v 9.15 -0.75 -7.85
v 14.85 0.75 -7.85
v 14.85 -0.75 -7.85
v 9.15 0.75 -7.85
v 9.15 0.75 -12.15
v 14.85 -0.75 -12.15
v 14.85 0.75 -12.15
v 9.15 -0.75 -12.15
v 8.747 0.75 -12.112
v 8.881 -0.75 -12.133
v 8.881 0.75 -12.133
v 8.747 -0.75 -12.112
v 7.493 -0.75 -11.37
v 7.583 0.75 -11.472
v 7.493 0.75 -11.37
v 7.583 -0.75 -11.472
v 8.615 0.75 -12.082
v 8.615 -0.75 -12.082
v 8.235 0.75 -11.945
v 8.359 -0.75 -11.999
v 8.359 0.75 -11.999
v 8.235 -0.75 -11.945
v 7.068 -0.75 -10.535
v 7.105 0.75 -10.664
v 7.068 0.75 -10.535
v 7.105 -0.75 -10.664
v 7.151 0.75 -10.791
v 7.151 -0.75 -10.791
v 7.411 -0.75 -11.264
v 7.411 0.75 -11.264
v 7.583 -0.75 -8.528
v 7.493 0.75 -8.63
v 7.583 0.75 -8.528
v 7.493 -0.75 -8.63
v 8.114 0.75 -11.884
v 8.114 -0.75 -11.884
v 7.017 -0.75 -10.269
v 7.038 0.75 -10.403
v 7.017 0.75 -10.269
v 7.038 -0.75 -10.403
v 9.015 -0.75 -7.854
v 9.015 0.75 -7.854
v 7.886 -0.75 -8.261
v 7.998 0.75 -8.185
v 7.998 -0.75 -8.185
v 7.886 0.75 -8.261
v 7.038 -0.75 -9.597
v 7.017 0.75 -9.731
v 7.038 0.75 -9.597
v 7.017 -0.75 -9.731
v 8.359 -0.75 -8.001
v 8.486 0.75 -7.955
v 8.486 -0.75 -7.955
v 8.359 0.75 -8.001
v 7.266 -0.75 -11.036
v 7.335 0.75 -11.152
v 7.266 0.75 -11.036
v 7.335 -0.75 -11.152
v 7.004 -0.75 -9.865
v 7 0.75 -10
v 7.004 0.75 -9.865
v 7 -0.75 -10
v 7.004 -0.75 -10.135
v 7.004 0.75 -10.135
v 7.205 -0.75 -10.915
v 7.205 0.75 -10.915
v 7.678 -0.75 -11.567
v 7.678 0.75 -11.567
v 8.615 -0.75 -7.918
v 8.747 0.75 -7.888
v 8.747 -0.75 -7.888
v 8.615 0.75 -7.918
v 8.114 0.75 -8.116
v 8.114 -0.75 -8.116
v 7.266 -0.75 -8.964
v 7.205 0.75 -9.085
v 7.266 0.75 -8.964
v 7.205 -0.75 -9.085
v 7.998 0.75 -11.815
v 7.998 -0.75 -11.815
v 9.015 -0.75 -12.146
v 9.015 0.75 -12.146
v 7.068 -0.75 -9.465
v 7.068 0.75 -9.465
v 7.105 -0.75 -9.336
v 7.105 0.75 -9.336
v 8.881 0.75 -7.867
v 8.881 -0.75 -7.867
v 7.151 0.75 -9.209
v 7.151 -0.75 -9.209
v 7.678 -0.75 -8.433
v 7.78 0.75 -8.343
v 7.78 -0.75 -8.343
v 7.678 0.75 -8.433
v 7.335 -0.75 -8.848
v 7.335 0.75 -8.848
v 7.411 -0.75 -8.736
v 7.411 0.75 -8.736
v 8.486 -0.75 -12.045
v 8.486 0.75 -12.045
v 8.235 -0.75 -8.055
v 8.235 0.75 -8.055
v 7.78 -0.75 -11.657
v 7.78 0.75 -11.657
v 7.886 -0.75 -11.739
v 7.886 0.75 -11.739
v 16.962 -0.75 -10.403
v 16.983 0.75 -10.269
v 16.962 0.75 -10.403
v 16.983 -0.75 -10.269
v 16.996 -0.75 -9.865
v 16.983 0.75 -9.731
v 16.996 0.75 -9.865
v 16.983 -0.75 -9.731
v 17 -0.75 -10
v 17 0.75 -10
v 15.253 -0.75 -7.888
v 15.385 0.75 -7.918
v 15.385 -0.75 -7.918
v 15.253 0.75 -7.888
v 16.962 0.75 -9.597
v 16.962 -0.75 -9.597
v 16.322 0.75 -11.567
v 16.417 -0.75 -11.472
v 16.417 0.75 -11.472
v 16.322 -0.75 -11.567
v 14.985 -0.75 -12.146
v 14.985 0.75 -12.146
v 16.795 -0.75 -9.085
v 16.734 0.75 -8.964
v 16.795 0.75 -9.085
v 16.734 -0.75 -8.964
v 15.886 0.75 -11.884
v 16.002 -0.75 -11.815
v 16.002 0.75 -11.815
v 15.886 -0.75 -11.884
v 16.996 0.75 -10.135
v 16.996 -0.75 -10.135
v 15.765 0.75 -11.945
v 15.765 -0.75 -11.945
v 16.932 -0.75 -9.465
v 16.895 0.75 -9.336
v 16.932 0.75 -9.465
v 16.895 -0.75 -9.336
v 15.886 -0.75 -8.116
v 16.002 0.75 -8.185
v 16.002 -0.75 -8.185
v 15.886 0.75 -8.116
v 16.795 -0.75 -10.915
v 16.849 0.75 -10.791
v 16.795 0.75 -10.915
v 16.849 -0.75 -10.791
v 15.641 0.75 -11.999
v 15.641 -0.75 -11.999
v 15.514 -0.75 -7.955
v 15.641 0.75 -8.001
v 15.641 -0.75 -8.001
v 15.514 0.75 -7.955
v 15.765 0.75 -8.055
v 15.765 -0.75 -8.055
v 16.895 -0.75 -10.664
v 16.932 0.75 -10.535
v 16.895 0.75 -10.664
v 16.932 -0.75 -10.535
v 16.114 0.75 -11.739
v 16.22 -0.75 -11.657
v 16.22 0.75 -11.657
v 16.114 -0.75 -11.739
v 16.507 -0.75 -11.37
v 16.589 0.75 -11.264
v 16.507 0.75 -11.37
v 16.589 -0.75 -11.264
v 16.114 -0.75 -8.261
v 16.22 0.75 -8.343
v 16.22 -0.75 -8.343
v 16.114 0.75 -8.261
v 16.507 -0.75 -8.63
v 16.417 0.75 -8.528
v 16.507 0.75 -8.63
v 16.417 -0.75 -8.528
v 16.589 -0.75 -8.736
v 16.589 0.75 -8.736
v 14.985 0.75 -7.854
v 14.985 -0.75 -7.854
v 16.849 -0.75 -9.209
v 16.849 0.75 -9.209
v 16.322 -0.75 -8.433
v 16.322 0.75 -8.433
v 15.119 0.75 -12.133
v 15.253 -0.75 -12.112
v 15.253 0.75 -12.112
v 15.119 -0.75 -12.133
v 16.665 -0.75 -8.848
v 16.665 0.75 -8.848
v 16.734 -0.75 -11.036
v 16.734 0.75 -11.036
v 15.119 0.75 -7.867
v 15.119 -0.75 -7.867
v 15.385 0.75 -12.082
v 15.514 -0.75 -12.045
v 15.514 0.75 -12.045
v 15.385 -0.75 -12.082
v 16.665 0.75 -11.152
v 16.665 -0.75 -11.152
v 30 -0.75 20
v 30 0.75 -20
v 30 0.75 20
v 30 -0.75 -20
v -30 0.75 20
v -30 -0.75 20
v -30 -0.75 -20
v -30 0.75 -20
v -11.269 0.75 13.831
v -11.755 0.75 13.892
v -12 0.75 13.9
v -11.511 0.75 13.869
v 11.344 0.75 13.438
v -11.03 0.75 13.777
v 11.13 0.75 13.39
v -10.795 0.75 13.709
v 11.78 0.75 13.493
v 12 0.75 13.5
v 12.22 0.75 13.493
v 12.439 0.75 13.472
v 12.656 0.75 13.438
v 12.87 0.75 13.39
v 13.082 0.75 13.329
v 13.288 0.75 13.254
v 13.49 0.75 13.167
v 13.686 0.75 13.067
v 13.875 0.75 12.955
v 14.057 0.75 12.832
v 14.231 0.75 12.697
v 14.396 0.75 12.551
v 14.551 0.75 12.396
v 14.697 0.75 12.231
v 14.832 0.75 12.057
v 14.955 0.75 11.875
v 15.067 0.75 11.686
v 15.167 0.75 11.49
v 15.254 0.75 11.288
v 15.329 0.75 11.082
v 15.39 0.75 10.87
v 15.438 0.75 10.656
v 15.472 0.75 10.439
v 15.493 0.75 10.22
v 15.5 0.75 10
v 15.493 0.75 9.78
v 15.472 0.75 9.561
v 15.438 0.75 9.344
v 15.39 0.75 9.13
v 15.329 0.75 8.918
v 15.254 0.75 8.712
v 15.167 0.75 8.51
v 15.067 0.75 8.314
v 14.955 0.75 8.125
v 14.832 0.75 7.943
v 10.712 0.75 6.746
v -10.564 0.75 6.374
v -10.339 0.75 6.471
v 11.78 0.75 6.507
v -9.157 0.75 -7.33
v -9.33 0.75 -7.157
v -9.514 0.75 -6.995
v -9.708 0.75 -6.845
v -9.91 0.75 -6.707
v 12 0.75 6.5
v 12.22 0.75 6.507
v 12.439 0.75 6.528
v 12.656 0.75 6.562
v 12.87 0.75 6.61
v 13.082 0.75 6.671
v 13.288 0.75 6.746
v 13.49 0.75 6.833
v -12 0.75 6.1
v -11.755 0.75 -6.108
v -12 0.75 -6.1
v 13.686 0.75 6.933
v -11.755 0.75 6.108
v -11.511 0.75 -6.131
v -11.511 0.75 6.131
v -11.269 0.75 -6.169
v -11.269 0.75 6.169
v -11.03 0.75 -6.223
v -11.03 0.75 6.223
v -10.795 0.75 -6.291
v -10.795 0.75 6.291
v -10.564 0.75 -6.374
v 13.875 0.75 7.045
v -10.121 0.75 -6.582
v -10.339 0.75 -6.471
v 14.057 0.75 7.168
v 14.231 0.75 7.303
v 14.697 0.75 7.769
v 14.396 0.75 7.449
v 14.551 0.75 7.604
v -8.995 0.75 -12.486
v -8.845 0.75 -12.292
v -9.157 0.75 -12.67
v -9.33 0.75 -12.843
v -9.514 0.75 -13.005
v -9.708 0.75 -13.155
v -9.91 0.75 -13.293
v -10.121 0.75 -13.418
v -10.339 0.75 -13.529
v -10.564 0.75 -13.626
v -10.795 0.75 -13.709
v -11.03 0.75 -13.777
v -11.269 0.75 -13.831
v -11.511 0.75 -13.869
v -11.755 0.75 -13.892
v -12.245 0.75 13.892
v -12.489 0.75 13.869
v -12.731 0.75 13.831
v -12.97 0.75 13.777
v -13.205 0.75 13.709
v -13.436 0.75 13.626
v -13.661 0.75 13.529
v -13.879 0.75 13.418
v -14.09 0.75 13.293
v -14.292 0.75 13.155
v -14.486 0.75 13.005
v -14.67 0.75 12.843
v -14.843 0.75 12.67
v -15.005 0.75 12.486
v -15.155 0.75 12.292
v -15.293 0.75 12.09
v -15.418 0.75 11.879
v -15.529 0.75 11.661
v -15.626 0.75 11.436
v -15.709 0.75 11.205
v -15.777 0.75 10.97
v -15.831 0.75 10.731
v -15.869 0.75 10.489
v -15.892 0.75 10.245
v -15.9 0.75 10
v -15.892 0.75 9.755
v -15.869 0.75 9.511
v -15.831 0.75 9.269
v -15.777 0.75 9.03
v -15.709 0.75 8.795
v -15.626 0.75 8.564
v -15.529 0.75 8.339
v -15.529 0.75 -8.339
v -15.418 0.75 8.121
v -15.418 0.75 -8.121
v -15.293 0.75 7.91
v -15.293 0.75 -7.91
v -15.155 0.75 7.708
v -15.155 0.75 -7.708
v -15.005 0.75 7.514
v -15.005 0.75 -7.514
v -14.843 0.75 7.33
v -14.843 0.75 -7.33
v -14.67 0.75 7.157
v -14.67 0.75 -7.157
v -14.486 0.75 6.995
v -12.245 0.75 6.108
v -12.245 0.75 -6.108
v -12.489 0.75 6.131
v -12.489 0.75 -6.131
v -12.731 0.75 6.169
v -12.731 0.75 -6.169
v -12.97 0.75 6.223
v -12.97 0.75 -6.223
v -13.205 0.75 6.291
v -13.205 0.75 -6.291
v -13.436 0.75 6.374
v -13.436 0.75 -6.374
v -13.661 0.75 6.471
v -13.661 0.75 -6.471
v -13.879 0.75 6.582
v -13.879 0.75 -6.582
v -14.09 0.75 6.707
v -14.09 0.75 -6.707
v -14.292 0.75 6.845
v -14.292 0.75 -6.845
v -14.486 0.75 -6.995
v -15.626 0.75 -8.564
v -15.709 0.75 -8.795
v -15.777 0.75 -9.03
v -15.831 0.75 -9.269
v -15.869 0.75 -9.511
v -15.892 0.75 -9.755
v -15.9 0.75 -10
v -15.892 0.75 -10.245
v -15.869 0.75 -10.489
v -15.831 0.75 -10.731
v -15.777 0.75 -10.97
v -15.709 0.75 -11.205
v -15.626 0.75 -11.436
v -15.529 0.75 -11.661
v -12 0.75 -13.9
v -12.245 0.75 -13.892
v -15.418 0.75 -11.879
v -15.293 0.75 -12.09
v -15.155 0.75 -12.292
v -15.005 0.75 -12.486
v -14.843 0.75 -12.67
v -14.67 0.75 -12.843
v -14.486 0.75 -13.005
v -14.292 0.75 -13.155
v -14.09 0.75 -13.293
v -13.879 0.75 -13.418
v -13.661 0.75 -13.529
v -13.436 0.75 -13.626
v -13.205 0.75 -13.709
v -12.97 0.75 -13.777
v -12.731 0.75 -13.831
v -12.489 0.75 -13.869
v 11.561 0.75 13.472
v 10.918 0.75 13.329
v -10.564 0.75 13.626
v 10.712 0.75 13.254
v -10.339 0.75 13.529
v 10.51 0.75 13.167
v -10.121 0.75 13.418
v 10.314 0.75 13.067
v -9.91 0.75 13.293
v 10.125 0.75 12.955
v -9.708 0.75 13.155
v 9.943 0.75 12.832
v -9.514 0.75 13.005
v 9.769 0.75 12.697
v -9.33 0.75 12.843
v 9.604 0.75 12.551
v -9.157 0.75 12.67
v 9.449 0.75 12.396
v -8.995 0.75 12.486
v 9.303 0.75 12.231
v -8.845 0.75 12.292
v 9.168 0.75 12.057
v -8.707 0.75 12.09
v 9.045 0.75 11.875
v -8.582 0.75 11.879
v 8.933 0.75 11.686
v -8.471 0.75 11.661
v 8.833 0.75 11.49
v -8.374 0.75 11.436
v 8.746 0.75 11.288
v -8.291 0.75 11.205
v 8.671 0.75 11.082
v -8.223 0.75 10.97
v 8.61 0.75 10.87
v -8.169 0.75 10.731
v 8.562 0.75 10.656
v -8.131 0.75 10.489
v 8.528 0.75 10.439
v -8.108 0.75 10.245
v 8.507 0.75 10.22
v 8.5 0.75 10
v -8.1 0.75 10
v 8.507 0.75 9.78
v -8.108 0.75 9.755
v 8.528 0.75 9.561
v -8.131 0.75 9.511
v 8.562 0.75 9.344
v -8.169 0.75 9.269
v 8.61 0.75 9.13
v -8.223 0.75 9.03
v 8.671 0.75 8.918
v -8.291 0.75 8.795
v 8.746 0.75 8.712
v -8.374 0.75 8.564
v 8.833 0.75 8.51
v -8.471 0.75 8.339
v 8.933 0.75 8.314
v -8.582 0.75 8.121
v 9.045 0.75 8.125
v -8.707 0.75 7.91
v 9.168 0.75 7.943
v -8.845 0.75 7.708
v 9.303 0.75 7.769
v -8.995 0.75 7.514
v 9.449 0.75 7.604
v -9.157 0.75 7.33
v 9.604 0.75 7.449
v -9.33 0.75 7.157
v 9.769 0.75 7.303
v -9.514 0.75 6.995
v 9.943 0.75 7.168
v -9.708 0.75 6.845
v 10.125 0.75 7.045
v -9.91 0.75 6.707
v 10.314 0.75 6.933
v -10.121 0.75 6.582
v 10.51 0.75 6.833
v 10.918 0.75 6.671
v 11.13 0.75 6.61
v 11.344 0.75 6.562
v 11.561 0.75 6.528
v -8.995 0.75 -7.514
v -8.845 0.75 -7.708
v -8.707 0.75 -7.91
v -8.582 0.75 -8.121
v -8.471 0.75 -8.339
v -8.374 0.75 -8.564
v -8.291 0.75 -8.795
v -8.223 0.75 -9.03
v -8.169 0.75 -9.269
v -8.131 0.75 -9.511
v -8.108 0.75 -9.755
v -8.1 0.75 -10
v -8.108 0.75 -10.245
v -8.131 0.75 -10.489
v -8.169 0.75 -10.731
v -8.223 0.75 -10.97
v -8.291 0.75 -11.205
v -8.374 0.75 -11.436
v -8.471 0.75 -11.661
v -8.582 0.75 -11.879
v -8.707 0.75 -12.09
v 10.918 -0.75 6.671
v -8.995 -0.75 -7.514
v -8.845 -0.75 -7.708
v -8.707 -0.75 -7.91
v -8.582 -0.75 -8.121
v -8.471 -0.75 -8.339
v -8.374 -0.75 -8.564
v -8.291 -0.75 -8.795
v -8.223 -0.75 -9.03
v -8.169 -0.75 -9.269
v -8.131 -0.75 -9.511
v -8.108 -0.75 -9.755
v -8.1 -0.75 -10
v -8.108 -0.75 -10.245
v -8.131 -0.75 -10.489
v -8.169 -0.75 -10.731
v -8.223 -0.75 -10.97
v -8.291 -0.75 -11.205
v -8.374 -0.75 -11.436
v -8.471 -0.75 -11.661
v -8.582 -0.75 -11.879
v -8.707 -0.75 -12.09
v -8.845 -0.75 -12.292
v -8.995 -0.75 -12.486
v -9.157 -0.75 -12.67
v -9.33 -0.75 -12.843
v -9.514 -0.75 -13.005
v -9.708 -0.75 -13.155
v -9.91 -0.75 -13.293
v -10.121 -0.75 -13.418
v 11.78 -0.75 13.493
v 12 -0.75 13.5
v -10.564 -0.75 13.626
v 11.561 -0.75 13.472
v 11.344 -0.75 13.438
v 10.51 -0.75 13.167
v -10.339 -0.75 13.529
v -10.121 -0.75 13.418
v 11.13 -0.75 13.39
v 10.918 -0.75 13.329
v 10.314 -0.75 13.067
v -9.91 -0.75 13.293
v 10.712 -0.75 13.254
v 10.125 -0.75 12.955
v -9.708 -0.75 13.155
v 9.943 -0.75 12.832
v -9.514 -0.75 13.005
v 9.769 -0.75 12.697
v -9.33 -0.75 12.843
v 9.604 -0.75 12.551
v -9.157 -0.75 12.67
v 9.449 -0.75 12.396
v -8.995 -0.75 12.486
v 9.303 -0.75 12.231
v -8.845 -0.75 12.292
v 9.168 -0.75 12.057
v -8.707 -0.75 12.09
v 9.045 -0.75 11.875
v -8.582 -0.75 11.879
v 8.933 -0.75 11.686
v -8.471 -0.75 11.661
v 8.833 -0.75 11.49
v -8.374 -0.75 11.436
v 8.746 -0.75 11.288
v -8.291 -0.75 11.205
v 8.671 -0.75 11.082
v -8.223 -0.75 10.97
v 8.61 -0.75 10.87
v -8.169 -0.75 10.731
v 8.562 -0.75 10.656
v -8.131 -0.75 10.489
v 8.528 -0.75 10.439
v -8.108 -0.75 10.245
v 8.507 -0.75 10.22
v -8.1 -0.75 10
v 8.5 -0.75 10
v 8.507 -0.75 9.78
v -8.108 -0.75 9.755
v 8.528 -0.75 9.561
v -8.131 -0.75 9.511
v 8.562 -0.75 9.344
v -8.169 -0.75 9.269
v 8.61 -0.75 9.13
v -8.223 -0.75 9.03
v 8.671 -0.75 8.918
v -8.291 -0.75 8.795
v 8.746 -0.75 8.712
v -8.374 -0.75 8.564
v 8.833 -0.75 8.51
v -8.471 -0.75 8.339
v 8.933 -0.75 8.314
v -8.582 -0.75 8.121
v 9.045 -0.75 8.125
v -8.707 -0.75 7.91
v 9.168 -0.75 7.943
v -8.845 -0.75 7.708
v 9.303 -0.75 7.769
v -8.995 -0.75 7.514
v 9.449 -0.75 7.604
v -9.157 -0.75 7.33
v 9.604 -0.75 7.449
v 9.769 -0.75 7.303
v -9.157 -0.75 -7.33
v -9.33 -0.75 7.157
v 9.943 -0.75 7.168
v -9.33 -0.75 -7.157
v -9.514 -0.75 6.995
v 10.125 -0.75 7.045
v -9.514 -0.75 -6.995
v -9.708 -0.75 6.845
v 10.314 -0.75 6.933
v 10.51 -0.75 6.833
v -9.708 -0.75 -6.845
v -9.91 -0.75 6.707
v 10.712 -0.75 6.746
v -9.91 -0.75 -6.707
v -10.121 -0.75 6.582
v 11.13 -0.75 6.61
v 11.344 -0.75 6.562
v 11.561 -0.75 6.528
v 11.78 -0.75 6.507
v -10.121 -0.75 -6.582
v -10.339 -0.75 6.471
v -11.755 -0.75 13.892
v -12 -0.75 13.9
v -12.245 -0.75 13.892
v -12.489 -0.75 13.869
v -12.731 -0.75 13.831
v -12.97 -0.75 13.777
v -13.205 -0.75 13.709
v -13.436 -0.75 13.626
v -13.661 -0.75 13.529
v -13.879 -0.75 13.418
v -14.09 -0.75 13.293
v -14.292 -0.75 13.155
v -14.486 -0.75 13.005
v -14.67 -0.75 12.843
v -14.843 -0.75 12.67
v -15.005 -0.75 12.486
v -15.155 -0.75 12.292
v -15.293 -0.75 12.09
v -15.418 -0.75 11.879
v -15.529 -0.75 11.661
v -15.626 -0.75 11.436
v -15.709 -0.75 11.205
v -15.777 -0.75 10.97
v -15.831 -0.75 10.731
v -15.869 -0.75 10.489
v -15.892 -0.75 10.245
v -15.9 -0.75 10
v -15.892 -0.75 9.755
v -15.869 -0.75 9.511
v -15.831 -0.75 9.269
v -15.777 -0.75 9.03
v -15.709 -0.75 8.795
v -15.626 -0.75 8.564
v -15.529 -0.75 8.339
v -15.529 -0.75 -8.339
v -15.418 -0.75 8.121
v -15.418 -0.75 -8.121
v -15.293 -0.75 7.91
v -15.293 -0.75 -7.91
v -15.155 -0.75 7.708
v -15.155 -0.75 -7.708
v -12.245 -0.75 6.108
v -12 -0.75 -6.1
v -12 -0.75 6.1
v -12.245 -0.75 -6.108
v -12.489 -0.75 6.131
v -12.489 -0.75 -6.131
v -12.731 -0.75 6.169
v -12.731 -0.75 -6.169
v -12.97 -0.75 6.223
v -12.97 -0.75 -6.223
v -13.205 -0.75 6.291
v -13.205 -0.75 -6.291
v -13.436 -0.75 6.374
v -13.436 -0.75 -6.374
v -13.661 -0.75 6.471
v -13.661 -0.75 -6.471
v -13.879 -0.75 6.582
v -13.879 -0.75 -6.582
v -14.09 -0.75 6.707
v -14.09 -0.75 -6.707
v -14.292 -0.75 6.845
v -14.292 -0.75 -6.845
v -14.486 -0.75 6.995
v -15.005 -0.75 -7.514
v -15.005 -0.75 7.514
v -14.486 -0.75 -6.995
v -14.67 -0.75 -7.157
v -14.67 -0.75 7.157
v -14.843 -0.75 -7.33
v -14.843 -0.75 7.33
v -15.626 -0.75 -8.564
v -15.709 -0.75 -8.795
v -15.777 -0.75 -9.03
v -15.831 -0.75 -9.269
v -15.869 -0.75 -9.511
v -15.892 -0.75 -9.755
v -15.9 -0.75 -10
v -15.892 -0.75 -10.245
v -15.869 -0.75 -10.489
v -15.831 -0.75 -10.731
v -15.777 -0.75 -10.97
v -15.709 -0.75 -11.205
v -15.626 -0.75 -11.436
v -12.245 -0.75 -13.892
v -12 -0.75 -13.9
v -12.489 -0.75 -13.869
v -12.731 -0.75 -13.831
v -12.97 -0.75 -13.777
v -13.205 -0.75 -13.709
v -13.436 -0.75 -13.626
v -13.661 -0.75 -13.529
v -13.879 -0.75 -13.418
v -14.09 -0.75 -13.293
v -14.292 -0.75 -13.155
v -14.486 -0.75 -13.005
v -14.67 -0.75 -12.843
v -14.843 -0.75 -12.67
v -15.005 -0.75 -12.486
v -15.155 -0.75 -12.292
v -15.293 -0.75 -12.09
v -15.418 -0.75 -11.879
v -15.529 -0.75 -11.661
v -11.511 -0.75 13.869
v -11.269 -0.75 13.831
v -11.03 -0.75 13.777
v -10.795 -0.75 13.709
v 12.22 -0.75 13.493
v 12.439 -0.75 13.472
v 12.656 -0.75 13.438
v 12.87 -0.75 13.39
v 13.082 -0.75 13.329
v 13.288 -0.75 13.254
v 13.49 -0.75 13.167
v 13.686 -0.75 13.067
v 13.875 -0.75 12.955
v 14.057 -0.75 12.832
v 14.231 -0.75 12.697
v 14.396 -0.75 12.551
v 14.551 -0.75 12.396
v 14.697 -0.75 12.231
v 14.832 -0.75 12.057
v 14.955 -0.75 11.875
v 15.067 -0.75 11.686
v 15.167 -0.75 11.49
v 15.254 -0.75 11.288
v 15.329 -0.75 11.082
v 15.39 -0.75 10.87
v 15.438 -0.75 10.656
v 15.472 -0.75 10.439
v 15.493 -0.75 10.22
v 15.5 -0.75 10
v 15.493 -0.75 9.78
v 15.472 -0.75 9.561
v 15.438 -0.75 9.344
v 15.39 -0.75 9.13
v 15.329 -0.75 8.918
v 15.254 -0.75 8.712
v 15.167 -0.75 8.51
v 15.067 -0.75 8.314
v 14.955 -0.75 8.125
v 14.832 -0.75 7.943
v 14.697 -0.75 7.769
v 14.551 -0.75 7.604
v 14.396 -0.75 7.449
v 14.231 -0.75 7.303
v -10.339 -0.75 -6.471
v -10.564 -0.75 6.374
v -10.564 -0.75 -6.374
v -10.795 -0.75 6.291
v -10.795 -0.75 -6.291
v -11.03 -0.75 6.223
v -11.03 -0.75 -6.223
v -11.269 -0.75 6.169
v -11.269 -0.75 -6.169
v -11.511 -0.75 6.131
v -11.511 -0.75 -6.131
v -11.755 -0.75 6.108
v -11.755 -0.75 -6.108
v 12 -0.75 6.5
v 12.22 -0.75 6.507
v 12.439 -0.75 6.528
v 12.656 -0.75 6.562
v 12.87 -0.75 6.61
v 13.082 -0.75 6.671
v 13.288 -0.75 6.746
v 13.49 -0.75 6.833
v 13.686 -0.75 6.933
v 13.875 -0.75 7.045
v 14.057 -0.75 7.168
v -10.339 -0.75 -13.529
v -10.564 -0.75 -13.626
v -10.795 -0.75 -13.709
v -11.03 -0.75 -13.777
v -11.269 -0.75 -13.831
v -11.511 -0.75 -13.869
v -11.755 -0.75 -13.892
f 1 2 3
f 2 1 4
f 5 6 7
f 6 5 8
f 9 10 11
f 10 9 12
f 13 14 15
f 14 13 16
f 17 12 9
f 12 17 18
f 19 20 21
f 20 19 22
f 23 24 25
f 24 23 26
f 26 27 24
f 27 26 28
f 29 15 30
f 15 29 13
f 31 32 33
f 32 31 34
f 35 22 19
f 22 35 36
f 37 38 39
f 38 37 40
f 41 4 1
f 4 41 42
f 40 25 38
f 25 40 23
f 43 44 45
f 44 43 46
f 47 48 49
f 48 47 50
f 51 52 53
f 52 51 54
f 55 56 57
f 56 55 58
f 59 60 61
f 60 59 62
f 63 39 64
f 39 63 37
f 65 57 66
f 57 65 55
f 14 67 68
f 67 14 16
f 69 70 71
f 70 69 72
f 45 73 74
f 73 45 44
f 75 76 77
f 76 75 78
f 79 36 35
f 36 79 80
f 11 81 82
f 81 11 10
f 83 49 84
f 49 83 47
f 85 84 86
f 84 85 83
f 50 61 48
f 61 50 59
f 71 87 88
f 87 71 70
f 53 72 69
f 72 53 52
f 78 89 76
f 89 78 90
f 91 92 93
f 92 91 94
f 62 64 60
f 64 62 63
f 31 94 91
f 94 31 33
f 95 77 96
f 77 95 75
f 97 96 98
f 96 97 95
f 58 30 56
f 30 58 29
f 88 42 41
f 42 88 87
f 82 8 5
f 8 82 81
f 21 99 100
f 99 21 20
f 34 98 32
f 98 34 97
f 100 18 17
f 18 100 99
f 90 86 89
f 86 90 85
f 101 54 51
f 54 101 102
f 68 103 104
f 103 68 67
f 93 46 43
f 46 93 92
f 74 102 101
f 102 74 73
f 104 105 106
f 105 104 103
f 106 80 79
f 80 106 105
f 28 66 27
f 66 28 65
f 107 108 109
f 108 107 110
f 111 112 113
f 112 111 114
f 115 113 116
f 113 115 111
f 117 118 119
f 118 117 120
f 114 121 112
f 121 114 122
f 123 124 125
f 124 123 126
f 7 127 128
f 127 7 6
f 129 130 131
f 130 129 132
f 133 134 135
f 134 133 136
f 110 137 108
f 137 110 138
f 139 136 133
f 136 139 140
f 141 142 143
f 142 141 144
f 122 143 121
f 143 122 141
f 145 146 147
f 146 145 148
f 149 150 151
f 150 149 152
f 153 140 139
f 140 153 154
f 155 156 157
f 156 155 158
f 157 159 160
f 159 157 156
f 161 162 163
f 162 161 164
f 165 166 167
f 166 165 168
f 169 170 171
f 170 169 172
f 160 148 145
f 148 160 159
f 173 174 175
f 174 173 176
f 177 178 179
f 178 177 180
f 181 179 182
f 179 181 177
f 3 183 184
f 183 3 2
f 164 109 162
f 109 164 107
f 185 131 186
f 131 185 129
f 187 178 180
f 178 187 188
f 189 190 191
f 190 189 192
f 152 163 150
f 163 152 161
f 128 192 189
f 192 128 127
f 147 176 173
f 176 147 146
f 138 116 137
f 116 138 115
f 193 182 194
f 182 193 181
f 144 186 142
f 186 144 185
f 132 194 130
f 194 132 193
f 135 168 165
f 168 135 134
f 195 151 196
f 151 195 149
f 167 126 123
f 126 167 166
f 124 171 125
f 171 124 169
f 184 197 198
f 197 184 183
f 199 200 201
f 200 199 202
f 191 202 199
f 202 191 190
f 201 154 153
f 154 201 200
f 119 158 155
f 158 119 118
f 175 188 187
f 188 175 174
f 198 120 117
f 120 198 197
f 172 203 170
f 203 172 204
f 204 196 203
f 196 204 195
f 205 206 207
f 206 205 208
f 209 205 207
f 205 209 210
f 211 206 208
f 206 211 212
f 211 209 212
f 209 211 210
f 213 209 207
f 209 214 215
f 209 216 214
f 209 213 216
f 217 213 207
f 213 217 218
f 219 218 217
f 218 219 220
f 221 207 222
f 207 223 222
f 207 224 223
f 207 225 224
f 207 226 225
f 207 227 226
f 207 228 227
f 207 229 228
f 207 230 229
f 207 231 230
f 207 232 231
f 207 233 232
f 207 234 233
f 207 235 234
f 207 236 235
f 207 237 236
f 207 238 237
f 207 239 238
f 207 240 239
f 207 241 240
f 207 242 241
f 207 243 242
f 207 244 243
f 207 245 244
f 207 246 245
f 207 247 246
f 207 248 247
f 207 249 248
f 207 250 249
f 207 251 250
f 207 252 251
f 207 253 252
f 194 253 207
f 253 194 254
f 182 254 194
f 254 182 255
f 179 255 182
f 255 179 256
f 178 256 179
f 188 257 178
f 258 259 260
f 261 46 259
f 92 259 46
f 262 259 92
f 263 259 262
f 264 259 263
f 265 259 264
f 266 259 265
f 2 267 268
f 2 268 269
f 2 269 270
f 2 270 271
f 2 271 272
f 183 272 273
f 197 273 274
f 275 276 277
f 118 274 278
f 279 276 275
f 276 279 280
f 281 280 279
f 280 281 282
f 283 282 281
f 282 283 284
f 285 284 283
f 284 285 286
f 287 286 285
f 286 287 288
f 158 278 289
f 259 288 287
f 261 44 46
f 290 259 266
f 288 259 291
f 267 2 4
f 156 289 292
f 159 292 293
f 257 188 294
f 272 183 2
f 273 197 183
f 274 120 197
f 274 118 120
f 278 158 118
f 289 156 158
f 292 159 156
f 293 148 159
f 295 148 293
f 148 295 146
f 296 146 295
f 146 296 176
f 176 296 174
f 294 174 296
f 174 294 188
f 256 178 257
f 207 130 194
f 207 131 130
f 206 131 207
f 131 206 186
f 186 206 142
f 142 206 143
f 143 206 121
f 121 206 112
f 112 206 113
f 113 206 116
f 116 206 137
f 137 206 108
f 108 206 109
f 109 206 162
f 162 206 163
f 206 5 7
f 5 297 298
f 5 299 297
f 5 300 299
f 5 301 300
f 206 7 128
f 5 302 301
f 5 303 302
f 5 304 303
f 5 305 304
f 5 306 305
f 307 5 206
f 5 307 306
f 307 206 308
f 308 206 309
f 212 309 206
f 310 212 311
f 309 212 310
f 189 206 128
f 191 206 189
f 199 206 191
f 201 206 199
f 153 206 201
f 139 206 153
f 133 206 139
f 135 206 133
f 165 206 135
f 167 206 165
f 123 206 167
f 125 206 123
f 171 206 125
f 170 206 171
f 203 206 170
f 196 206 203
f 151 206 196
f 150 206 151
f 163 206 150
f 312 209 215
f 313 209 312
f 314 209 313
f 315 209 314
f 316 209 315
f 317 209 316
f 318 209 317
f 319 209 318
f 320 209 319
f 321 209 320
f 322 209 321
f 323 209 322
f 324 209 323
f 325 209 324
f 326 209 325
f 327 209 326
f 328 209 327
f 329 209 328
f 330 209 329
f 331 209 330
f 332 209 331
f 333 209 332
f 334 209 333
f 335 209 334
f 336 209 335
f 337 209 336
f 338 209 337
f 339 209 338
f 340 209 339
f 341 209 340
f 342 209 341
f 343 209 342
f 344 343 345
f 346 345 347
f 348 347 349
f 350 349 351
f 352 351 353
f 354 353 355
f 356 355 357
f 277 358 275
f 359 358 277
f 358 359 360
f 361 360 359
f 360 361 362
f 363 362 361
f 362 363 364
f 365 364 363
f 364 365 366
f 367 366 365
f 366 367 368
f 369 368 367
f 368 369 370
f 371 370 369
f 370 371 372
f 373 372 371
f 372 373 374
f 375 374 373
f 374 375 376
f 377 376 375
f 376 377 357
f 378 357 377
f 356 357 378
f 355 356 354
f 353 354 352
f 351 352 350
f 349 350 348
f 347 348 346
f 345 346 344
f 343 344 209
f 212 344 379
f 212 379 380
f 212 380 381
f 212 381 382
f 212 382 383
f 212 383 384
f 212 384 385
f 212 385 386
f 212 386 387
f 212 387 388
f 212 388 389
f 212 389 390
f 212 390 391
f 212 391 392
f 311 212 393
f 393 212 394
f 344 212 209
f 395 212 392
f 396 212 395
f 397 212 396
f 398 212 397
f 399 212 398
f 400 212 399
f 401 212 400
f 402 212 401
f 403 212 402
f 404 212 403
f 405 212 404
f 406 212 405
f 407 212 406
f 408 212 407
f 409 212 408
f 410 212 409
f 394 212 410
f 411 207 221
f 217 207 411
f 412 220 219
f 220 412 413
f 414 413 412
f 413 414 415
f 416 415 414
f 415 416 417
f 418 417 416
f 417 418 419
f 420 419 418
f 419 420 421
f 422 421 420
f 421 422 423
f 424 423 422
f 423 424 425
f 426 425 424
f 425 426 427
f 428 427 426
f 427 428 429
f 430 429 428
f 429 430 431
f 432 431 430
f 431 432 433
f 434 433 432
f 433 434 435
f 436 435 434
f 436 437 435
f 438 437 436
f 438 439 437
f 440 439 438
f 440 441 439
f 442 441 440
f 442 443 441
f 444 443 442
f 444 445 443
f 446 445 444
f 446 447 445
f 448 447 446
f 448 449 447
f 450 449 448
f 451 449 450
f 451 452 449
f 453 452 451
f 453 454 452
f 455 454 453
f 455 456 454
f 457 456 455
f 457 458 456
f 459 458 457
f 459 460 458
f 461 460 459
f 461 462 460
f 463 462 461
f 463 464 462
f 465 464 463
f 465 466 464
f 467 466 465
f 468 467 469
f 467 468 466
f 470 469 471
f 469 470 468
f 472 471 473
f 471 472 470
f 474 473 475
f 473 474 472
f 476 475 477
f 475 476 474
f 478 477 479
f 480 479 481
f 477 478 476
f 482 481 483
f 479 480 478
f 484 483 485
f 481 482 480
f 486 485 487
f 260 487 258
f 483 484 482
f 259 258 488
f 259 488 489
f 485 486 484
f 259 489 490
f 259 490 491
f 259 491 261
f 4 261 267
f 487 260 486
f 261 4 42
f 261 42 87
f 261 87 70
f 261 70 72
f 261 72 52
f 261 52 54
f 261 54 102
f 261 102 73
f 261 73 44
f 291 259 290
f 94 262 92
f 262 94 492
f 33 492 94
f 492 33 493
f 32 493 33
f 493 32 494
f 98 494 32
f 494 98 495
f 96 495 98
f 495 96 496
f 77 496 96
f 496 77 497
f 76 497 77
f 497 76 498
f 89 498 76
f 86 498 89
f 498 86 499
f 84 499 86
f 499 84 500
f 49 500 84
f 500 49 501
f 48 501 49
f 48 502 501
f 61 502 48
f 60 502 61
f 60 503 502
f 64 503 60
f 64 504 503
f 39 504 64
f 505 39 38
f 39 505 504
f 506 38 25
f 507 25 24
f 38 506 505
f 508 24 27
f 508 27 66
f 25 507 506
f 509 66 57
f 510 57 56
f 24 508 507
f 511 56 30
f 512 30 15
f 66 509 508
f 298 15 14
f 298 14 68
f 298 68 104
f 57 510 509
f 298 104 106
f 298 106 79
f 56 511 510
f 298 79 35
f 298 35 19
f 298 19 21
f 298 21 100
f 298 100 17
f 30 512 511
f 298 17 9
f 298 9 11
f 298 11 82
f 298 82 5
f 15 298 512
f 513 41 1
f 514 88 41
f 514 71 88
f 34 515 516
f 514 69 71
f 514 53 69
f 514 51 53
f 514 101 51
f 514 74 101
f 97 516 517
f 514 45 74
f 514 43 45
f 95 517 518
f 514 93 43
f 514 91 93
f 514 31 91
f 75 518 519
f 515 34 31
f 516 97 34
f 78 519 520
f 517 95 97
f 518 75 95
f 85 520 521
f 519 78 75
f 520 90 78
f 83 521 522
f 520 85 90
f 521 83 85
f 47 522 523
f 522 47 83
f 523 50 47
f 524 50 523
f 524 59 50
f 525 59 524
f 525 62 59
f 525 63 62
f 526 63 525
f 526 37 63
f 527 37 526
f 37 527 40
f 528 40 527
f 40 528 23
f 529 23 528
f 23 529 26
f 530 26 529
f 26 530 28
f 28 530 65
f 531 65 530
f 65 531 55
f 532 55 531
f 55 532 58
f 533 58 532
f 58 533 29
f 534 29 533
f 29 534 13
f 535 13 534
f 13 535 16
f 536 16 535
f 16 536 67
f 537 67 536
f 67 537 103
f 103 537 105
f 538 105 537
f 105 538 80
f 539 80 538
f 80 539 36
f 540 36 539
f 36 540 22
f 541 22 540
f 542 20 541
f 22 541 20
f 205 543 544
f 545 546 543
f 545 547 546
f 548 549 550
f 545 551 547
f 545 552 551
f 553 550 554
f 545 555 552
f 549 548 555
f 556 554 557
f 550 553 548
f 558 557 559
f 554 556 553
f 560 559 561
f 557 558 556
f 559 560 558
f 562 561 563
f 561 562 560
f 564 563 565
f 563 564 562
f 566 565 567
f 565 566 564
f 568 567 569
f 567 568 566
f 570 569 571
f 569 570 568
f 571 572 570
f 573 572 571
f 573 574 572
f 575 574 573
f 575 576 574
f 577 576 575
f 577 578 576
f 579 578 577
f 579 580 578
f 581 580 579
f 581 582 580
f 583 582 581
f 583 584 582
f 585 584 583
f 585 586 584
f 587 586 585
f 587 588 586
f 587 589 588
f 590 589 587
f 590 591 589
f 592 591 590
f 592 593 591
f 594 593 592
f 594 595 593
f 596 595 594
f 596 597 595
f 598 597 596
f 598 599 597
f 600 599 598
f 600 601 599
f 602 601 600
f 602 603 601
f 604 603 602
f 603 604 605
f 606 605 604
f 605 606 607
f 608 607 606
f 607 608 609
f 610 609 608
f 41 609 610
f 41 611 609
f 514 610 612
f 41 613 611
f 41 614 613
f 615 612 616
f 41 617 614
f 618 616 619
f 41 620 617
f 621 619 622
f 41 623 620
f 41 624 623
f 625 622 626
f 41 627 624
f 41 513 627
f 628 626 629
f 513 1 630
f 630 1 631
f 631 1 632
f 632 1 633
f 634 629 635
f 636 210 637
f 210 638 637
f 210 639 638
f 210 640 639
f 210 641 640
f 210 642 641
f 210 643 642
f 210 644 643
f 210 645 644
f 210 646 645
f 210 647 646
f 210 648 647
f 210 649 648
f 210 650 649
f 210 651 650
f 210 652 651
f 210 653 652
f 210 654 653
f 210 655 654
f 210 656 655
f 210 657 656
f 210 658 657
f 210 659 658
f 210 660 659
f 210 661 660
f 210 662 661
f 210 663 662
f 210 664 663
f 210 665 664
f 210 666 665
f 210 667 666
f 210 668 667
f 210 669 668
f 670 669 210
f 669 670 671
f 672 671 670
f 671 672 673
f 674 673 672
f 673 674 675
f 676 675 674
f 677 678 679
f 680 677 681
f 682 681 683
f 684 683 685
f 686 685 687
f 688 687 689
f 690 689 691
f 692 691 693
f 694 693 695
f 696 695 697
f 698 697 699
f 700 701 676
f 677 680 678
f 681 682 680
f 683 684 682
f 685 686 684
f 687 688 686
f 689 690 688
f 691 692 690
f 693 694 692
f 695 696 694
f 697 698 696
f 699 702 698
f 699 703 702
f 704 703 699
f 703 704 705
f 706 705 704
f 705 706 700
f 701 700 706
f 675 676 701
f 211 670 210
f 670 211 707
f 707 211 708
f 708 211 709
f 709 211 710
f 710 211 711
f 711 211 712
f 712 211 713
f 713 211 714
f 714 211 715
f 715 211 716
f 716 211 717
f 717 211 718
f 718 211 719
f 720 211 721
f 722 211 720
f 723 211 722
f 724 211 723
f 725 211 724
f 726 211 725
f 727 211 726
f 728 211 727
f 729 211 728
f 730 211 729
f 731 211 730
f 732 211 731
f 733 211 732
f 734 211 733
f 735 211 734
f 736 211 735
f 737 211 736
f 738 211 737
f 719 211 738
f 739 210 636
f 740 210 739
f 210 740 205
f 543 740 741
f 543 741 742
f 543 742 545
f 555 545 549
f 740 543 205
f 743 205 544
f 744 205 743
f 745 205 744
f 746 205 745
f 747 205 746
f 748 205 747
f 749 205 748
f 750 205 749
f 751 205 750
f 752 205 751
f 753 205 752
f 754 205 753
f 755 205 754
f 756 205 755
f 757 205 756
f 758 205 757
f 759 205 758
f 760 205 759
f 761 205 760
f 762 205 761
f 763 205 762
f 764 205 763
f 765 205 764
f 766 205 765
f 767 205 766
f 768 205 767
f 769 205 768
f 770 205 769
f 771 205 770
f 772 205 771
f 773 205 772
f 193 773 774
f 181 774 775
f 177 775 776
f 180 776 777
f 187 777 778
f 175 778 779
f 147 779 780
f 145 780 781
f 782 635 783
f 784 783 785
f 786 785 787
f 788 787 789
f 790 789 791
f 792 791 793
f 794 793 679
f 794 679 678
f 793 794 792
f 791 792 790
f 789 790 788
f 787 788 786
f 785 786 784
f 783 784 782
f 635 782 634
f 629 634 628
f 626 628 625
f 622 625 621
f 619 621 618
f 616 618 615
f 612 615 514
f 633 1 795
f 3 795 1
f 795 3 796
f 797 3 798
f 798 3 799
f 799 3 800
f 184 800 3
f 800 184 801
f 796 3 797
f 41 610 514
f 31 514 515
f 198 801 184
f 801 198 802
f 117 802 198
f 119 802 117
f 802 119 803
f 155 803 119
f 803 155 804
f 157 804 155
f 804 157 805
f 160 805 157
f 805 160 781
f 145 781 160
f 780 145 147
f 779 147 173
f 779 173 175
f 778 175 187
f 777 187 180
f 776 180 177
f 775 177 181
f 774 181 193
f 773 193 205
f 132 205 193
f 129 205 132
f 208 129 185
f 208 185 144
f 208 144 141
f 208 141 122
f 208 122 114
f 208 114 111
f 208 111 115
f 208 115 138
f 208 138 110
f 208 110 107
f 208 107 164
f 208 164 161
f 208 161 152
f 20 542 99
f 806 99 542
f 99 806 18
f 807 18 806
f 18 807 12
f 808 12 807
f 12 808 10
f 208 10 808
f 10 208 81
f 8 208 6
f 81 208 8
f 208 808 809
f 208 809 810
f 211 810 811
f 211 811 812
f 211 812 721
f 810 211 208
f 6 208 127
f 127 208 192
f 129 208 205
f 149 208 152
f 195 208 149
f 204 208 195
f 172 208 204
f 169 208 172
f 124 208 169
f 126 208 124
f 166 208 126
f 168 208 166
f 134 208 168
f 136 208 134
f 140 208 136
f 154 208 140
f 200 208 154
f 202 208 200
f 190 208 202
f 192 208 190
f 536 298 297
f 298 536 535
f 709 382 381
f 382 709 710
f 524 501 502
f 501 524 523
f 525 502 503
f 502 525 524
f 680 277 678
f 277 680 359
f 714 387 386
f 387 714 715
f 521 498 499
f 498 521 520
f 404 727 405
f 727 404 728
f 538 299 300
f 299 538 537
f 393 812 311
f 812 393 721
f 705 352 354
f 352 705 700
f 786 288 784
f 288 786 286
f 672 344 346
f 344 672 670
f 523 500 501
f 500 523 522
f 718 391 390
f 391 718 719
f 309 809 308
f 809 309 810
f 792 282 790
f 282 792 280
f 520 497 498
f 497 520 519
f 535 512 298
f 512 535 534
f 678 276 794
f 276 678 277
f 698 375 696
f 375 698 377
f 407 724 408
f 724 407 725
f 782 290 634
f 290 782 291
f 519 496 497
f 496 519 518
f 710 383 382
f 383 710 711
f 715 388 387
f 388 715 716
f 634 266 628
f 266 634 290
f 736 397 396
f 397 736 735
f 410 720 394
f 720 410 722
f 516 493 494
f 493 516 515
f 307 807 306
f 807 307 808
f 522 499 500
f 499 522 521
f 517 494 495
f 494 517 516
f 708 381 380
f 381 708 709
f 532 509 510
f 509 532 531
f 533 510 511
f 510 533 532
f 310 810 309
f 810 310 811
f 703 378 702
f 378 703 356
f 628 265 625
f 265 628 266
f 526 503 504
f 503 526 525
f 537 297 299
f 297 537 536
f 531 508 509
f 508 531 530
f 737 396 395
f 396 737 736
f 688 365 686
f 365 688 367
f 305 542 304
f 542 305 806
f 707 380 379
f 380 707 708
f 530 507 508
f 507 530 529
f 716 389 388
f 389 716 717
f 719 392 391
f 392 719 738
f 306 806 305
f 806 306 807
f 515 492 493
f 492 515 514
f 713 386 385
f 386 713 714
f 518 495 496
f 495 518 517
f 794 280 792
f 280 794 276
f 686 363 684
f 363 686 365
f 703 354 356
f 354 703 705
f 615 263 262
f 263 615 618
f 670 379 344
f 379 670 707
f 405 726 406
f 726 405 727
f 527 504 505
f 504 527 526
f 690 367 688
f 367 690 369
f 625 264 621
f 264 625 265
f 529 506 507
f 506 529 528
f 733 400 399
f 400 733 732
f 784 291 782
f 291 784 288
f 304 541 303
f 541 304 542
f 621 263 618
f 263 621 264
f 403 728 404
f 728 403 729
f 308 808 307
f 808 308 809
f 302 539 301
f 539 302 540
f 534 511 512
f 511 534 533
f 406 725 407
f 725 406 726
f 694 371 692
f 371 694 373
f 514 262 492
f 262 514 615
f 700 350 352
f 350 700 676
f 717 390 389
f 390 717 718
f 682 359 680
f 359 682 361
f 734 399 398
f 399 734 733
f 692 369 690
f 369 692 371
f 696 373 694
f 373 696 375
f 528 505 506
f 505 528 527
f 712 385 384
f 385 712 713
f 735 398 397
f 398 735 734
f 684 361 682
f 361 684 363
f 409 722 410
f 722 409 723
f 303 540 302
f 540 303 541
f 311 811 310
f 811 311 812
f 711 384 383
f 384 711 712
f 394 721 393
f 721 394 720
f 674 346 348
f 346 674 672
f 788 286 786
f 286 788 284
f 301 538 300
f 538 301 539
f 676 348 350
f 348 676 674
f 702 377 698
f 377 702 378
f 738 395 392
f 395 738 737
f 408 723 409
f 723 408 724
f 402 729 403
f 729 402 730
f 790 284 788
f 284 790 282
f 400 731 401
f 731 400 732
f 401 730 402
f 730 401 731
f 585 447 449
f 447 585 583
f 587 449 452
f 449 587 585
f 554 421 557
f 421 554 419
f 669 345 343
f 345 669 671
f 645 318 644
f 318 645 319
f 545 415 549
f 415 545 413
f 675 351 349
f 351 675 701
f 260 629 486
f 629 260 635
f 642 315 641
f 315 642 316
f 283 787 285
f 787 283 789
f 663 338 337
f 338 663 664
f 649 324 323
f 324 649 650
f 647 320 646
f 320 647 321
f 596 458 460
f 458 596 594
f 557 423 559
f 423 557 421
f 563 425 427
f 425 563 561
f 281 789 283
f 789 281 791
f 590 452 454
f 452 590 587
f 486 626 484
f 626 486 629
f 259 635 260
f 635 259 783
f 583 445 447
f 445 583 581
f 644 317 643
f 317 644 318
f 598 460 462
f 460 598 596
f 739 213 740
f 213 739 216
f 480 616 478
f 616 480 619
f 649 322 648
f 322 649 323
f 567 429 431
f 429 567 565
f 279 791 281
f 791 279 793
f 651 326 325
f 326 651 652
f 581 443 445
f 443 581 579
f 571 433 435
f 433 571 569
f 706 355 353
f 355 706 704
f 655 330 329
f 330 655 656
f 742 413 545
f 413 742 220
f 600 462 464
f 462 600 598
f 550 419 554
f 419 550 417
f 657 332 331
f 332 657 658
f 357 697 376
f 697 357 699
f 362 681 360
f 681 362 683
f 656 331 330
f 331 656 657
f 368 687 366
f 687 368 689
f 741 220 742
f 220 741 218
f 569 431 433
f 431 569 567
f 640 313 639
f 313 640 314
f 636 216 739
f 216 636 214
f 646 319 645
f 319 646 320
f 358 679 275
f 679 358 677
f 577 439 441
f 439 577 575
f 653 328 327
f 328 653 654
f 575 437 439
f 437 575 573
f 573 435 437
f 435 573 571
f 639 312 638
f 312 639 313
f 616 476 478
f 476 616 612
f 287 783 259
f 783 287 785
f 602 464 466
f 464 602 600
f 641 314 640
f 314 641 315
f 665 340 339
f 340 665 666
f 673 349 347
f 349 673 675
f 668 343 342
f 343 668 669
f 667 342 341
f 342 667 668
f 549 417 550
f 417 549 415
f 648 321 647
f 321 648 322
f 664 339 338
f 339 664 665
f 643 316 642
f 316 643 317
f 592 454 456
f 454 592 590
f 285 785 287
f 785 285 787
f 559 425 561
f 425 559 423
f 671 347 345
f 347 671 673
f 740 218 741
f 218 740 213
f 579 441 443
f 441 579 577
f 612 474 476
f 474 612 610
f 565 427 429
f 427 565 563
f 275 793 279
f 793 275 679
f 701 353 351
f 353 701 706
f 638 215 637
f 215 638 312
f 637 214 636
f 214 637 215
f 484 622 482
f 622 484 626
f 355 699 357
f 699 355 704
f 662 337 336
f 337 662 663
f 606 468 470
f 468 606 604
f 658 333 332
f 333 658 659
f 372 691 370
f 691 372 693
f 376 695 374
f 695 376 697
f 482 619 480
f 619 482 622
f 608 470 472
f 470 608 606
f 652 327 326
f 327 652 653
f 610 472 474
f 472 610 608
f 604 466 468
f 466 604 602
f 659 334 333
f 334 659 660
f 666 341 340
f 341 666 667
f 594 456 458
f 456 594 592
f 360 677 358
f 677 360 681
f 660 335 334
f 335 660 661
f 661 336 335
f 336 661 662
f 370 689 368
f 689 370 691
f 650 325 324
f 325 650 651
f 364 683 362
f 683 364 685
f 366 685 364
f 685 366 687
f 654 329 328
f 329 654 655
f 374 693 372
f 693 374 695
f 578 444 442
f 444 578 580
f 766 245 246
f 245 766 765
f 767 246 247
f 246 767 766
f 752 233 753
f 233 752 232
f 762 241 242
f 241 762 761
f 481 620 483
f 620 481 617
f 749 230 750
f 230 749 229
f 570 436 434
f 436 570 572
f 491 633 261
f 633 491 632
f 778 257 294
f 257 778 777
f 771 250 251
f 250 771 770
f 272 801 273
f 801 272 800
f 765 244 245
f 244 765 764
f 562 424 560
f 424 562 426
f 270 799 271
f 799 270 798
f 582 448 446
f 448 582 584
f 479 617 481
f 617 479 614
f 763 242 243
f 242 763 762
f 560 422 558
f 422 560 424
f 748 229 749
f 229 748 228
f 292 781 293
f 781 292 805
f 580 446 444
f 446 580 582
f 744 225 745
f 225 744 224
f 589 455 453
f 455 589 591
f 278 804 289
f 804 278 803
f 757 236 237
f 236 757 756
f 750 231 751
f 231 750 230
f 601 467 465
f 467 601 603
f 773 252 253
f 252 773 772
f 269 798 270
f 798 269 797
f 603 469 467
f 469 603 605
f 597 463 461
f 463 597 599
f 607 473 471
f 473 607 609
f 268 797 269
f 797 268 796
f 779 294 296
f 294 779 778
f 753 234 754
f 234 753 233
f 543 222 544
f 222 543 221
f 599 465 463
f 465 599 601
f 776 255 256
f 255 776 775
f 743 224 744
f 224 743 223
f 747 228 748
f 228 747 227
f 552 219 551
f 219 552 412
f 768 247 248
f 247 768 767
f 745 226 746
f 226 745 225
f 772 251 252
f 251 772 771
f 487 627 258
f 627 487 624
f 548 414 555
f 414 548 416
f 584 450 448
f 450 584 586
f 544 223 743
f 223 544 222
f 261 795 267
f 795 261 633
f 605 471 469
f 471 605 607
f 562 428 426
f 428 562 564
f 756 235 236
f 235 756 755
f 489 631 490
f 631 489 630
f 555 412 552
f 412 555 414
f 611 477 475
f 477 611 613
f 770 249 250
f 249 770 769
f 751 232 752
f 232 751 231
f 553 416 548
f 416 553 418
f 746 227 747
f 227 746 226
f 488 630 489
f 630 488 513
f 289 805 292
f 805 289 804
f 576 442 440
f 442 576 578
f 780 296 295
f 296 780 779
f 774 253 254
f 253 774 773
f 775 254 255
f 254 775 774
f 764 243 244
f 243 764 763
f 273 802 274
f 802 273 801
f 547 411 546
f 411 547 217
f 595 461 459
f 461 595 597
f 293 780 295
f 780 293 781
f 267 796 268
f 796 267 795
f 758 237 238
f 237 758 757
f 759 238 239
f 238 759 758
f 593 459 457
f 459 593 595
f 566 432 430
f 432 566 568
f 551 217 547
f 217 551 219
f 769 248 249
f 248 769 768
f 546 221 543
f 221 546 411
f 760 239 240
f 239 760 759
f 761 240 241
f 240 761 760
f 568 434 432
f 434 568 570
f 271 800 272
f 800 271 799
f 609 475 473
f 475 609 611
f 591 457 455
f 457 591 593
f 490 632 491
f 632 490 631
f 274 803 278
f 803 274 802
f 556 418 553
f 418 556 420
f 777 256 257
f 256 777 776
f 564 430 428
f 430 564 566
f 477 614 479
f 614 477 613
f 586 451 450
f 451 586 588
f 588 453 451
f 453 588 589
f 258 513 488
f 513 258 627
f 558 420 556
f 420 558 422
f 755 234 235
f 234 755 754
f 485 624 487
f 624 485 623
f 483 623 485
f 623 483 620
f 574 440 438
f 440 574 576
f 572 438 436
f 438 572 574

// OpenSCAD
$fn=100;
eps=1/128;

h=40;
w=60;
wt=1.5;
usbc=28; // usb c board depth
usbc_w=9+1; // usb c plug width
usbc_h=3.3+1; // usb c plug height
sd=6; // switch hole diameter
pd=6.8; // potentionmeter hole diameter



difference() {
    cube([w,wt,h], center=true);
    translate([-12,0,-10]) rotate([90,0,0]) cylinder(wt+2, d=pd+1, center=true);
    translate([-12,0,10]) rotate([90,0,0]) cylinder(wt+2, d=pd+1, center=true);
    translate([12,0,10]) rotate([90,0,0]) cylinder(wt+2, d=sd+1, center=true);
    translate([12,0,-10]) usbchole();
}

module usbchole() {
    union() {
        cube([usbc_w-usbc_h,wt+2,usbc_h], center=true);
        translate([-(usbc_w-usbc_h)/2,0,0]) rotate([90,0,0]) cylinder(h=wt+2, d=usbc_h, center=true);
        translate([(usbc_w-usbc_h)/2,0,0]) rotate([90,0,0]) cylinder(h=wt+2, d=usbc_h, center=true);
    }
}
